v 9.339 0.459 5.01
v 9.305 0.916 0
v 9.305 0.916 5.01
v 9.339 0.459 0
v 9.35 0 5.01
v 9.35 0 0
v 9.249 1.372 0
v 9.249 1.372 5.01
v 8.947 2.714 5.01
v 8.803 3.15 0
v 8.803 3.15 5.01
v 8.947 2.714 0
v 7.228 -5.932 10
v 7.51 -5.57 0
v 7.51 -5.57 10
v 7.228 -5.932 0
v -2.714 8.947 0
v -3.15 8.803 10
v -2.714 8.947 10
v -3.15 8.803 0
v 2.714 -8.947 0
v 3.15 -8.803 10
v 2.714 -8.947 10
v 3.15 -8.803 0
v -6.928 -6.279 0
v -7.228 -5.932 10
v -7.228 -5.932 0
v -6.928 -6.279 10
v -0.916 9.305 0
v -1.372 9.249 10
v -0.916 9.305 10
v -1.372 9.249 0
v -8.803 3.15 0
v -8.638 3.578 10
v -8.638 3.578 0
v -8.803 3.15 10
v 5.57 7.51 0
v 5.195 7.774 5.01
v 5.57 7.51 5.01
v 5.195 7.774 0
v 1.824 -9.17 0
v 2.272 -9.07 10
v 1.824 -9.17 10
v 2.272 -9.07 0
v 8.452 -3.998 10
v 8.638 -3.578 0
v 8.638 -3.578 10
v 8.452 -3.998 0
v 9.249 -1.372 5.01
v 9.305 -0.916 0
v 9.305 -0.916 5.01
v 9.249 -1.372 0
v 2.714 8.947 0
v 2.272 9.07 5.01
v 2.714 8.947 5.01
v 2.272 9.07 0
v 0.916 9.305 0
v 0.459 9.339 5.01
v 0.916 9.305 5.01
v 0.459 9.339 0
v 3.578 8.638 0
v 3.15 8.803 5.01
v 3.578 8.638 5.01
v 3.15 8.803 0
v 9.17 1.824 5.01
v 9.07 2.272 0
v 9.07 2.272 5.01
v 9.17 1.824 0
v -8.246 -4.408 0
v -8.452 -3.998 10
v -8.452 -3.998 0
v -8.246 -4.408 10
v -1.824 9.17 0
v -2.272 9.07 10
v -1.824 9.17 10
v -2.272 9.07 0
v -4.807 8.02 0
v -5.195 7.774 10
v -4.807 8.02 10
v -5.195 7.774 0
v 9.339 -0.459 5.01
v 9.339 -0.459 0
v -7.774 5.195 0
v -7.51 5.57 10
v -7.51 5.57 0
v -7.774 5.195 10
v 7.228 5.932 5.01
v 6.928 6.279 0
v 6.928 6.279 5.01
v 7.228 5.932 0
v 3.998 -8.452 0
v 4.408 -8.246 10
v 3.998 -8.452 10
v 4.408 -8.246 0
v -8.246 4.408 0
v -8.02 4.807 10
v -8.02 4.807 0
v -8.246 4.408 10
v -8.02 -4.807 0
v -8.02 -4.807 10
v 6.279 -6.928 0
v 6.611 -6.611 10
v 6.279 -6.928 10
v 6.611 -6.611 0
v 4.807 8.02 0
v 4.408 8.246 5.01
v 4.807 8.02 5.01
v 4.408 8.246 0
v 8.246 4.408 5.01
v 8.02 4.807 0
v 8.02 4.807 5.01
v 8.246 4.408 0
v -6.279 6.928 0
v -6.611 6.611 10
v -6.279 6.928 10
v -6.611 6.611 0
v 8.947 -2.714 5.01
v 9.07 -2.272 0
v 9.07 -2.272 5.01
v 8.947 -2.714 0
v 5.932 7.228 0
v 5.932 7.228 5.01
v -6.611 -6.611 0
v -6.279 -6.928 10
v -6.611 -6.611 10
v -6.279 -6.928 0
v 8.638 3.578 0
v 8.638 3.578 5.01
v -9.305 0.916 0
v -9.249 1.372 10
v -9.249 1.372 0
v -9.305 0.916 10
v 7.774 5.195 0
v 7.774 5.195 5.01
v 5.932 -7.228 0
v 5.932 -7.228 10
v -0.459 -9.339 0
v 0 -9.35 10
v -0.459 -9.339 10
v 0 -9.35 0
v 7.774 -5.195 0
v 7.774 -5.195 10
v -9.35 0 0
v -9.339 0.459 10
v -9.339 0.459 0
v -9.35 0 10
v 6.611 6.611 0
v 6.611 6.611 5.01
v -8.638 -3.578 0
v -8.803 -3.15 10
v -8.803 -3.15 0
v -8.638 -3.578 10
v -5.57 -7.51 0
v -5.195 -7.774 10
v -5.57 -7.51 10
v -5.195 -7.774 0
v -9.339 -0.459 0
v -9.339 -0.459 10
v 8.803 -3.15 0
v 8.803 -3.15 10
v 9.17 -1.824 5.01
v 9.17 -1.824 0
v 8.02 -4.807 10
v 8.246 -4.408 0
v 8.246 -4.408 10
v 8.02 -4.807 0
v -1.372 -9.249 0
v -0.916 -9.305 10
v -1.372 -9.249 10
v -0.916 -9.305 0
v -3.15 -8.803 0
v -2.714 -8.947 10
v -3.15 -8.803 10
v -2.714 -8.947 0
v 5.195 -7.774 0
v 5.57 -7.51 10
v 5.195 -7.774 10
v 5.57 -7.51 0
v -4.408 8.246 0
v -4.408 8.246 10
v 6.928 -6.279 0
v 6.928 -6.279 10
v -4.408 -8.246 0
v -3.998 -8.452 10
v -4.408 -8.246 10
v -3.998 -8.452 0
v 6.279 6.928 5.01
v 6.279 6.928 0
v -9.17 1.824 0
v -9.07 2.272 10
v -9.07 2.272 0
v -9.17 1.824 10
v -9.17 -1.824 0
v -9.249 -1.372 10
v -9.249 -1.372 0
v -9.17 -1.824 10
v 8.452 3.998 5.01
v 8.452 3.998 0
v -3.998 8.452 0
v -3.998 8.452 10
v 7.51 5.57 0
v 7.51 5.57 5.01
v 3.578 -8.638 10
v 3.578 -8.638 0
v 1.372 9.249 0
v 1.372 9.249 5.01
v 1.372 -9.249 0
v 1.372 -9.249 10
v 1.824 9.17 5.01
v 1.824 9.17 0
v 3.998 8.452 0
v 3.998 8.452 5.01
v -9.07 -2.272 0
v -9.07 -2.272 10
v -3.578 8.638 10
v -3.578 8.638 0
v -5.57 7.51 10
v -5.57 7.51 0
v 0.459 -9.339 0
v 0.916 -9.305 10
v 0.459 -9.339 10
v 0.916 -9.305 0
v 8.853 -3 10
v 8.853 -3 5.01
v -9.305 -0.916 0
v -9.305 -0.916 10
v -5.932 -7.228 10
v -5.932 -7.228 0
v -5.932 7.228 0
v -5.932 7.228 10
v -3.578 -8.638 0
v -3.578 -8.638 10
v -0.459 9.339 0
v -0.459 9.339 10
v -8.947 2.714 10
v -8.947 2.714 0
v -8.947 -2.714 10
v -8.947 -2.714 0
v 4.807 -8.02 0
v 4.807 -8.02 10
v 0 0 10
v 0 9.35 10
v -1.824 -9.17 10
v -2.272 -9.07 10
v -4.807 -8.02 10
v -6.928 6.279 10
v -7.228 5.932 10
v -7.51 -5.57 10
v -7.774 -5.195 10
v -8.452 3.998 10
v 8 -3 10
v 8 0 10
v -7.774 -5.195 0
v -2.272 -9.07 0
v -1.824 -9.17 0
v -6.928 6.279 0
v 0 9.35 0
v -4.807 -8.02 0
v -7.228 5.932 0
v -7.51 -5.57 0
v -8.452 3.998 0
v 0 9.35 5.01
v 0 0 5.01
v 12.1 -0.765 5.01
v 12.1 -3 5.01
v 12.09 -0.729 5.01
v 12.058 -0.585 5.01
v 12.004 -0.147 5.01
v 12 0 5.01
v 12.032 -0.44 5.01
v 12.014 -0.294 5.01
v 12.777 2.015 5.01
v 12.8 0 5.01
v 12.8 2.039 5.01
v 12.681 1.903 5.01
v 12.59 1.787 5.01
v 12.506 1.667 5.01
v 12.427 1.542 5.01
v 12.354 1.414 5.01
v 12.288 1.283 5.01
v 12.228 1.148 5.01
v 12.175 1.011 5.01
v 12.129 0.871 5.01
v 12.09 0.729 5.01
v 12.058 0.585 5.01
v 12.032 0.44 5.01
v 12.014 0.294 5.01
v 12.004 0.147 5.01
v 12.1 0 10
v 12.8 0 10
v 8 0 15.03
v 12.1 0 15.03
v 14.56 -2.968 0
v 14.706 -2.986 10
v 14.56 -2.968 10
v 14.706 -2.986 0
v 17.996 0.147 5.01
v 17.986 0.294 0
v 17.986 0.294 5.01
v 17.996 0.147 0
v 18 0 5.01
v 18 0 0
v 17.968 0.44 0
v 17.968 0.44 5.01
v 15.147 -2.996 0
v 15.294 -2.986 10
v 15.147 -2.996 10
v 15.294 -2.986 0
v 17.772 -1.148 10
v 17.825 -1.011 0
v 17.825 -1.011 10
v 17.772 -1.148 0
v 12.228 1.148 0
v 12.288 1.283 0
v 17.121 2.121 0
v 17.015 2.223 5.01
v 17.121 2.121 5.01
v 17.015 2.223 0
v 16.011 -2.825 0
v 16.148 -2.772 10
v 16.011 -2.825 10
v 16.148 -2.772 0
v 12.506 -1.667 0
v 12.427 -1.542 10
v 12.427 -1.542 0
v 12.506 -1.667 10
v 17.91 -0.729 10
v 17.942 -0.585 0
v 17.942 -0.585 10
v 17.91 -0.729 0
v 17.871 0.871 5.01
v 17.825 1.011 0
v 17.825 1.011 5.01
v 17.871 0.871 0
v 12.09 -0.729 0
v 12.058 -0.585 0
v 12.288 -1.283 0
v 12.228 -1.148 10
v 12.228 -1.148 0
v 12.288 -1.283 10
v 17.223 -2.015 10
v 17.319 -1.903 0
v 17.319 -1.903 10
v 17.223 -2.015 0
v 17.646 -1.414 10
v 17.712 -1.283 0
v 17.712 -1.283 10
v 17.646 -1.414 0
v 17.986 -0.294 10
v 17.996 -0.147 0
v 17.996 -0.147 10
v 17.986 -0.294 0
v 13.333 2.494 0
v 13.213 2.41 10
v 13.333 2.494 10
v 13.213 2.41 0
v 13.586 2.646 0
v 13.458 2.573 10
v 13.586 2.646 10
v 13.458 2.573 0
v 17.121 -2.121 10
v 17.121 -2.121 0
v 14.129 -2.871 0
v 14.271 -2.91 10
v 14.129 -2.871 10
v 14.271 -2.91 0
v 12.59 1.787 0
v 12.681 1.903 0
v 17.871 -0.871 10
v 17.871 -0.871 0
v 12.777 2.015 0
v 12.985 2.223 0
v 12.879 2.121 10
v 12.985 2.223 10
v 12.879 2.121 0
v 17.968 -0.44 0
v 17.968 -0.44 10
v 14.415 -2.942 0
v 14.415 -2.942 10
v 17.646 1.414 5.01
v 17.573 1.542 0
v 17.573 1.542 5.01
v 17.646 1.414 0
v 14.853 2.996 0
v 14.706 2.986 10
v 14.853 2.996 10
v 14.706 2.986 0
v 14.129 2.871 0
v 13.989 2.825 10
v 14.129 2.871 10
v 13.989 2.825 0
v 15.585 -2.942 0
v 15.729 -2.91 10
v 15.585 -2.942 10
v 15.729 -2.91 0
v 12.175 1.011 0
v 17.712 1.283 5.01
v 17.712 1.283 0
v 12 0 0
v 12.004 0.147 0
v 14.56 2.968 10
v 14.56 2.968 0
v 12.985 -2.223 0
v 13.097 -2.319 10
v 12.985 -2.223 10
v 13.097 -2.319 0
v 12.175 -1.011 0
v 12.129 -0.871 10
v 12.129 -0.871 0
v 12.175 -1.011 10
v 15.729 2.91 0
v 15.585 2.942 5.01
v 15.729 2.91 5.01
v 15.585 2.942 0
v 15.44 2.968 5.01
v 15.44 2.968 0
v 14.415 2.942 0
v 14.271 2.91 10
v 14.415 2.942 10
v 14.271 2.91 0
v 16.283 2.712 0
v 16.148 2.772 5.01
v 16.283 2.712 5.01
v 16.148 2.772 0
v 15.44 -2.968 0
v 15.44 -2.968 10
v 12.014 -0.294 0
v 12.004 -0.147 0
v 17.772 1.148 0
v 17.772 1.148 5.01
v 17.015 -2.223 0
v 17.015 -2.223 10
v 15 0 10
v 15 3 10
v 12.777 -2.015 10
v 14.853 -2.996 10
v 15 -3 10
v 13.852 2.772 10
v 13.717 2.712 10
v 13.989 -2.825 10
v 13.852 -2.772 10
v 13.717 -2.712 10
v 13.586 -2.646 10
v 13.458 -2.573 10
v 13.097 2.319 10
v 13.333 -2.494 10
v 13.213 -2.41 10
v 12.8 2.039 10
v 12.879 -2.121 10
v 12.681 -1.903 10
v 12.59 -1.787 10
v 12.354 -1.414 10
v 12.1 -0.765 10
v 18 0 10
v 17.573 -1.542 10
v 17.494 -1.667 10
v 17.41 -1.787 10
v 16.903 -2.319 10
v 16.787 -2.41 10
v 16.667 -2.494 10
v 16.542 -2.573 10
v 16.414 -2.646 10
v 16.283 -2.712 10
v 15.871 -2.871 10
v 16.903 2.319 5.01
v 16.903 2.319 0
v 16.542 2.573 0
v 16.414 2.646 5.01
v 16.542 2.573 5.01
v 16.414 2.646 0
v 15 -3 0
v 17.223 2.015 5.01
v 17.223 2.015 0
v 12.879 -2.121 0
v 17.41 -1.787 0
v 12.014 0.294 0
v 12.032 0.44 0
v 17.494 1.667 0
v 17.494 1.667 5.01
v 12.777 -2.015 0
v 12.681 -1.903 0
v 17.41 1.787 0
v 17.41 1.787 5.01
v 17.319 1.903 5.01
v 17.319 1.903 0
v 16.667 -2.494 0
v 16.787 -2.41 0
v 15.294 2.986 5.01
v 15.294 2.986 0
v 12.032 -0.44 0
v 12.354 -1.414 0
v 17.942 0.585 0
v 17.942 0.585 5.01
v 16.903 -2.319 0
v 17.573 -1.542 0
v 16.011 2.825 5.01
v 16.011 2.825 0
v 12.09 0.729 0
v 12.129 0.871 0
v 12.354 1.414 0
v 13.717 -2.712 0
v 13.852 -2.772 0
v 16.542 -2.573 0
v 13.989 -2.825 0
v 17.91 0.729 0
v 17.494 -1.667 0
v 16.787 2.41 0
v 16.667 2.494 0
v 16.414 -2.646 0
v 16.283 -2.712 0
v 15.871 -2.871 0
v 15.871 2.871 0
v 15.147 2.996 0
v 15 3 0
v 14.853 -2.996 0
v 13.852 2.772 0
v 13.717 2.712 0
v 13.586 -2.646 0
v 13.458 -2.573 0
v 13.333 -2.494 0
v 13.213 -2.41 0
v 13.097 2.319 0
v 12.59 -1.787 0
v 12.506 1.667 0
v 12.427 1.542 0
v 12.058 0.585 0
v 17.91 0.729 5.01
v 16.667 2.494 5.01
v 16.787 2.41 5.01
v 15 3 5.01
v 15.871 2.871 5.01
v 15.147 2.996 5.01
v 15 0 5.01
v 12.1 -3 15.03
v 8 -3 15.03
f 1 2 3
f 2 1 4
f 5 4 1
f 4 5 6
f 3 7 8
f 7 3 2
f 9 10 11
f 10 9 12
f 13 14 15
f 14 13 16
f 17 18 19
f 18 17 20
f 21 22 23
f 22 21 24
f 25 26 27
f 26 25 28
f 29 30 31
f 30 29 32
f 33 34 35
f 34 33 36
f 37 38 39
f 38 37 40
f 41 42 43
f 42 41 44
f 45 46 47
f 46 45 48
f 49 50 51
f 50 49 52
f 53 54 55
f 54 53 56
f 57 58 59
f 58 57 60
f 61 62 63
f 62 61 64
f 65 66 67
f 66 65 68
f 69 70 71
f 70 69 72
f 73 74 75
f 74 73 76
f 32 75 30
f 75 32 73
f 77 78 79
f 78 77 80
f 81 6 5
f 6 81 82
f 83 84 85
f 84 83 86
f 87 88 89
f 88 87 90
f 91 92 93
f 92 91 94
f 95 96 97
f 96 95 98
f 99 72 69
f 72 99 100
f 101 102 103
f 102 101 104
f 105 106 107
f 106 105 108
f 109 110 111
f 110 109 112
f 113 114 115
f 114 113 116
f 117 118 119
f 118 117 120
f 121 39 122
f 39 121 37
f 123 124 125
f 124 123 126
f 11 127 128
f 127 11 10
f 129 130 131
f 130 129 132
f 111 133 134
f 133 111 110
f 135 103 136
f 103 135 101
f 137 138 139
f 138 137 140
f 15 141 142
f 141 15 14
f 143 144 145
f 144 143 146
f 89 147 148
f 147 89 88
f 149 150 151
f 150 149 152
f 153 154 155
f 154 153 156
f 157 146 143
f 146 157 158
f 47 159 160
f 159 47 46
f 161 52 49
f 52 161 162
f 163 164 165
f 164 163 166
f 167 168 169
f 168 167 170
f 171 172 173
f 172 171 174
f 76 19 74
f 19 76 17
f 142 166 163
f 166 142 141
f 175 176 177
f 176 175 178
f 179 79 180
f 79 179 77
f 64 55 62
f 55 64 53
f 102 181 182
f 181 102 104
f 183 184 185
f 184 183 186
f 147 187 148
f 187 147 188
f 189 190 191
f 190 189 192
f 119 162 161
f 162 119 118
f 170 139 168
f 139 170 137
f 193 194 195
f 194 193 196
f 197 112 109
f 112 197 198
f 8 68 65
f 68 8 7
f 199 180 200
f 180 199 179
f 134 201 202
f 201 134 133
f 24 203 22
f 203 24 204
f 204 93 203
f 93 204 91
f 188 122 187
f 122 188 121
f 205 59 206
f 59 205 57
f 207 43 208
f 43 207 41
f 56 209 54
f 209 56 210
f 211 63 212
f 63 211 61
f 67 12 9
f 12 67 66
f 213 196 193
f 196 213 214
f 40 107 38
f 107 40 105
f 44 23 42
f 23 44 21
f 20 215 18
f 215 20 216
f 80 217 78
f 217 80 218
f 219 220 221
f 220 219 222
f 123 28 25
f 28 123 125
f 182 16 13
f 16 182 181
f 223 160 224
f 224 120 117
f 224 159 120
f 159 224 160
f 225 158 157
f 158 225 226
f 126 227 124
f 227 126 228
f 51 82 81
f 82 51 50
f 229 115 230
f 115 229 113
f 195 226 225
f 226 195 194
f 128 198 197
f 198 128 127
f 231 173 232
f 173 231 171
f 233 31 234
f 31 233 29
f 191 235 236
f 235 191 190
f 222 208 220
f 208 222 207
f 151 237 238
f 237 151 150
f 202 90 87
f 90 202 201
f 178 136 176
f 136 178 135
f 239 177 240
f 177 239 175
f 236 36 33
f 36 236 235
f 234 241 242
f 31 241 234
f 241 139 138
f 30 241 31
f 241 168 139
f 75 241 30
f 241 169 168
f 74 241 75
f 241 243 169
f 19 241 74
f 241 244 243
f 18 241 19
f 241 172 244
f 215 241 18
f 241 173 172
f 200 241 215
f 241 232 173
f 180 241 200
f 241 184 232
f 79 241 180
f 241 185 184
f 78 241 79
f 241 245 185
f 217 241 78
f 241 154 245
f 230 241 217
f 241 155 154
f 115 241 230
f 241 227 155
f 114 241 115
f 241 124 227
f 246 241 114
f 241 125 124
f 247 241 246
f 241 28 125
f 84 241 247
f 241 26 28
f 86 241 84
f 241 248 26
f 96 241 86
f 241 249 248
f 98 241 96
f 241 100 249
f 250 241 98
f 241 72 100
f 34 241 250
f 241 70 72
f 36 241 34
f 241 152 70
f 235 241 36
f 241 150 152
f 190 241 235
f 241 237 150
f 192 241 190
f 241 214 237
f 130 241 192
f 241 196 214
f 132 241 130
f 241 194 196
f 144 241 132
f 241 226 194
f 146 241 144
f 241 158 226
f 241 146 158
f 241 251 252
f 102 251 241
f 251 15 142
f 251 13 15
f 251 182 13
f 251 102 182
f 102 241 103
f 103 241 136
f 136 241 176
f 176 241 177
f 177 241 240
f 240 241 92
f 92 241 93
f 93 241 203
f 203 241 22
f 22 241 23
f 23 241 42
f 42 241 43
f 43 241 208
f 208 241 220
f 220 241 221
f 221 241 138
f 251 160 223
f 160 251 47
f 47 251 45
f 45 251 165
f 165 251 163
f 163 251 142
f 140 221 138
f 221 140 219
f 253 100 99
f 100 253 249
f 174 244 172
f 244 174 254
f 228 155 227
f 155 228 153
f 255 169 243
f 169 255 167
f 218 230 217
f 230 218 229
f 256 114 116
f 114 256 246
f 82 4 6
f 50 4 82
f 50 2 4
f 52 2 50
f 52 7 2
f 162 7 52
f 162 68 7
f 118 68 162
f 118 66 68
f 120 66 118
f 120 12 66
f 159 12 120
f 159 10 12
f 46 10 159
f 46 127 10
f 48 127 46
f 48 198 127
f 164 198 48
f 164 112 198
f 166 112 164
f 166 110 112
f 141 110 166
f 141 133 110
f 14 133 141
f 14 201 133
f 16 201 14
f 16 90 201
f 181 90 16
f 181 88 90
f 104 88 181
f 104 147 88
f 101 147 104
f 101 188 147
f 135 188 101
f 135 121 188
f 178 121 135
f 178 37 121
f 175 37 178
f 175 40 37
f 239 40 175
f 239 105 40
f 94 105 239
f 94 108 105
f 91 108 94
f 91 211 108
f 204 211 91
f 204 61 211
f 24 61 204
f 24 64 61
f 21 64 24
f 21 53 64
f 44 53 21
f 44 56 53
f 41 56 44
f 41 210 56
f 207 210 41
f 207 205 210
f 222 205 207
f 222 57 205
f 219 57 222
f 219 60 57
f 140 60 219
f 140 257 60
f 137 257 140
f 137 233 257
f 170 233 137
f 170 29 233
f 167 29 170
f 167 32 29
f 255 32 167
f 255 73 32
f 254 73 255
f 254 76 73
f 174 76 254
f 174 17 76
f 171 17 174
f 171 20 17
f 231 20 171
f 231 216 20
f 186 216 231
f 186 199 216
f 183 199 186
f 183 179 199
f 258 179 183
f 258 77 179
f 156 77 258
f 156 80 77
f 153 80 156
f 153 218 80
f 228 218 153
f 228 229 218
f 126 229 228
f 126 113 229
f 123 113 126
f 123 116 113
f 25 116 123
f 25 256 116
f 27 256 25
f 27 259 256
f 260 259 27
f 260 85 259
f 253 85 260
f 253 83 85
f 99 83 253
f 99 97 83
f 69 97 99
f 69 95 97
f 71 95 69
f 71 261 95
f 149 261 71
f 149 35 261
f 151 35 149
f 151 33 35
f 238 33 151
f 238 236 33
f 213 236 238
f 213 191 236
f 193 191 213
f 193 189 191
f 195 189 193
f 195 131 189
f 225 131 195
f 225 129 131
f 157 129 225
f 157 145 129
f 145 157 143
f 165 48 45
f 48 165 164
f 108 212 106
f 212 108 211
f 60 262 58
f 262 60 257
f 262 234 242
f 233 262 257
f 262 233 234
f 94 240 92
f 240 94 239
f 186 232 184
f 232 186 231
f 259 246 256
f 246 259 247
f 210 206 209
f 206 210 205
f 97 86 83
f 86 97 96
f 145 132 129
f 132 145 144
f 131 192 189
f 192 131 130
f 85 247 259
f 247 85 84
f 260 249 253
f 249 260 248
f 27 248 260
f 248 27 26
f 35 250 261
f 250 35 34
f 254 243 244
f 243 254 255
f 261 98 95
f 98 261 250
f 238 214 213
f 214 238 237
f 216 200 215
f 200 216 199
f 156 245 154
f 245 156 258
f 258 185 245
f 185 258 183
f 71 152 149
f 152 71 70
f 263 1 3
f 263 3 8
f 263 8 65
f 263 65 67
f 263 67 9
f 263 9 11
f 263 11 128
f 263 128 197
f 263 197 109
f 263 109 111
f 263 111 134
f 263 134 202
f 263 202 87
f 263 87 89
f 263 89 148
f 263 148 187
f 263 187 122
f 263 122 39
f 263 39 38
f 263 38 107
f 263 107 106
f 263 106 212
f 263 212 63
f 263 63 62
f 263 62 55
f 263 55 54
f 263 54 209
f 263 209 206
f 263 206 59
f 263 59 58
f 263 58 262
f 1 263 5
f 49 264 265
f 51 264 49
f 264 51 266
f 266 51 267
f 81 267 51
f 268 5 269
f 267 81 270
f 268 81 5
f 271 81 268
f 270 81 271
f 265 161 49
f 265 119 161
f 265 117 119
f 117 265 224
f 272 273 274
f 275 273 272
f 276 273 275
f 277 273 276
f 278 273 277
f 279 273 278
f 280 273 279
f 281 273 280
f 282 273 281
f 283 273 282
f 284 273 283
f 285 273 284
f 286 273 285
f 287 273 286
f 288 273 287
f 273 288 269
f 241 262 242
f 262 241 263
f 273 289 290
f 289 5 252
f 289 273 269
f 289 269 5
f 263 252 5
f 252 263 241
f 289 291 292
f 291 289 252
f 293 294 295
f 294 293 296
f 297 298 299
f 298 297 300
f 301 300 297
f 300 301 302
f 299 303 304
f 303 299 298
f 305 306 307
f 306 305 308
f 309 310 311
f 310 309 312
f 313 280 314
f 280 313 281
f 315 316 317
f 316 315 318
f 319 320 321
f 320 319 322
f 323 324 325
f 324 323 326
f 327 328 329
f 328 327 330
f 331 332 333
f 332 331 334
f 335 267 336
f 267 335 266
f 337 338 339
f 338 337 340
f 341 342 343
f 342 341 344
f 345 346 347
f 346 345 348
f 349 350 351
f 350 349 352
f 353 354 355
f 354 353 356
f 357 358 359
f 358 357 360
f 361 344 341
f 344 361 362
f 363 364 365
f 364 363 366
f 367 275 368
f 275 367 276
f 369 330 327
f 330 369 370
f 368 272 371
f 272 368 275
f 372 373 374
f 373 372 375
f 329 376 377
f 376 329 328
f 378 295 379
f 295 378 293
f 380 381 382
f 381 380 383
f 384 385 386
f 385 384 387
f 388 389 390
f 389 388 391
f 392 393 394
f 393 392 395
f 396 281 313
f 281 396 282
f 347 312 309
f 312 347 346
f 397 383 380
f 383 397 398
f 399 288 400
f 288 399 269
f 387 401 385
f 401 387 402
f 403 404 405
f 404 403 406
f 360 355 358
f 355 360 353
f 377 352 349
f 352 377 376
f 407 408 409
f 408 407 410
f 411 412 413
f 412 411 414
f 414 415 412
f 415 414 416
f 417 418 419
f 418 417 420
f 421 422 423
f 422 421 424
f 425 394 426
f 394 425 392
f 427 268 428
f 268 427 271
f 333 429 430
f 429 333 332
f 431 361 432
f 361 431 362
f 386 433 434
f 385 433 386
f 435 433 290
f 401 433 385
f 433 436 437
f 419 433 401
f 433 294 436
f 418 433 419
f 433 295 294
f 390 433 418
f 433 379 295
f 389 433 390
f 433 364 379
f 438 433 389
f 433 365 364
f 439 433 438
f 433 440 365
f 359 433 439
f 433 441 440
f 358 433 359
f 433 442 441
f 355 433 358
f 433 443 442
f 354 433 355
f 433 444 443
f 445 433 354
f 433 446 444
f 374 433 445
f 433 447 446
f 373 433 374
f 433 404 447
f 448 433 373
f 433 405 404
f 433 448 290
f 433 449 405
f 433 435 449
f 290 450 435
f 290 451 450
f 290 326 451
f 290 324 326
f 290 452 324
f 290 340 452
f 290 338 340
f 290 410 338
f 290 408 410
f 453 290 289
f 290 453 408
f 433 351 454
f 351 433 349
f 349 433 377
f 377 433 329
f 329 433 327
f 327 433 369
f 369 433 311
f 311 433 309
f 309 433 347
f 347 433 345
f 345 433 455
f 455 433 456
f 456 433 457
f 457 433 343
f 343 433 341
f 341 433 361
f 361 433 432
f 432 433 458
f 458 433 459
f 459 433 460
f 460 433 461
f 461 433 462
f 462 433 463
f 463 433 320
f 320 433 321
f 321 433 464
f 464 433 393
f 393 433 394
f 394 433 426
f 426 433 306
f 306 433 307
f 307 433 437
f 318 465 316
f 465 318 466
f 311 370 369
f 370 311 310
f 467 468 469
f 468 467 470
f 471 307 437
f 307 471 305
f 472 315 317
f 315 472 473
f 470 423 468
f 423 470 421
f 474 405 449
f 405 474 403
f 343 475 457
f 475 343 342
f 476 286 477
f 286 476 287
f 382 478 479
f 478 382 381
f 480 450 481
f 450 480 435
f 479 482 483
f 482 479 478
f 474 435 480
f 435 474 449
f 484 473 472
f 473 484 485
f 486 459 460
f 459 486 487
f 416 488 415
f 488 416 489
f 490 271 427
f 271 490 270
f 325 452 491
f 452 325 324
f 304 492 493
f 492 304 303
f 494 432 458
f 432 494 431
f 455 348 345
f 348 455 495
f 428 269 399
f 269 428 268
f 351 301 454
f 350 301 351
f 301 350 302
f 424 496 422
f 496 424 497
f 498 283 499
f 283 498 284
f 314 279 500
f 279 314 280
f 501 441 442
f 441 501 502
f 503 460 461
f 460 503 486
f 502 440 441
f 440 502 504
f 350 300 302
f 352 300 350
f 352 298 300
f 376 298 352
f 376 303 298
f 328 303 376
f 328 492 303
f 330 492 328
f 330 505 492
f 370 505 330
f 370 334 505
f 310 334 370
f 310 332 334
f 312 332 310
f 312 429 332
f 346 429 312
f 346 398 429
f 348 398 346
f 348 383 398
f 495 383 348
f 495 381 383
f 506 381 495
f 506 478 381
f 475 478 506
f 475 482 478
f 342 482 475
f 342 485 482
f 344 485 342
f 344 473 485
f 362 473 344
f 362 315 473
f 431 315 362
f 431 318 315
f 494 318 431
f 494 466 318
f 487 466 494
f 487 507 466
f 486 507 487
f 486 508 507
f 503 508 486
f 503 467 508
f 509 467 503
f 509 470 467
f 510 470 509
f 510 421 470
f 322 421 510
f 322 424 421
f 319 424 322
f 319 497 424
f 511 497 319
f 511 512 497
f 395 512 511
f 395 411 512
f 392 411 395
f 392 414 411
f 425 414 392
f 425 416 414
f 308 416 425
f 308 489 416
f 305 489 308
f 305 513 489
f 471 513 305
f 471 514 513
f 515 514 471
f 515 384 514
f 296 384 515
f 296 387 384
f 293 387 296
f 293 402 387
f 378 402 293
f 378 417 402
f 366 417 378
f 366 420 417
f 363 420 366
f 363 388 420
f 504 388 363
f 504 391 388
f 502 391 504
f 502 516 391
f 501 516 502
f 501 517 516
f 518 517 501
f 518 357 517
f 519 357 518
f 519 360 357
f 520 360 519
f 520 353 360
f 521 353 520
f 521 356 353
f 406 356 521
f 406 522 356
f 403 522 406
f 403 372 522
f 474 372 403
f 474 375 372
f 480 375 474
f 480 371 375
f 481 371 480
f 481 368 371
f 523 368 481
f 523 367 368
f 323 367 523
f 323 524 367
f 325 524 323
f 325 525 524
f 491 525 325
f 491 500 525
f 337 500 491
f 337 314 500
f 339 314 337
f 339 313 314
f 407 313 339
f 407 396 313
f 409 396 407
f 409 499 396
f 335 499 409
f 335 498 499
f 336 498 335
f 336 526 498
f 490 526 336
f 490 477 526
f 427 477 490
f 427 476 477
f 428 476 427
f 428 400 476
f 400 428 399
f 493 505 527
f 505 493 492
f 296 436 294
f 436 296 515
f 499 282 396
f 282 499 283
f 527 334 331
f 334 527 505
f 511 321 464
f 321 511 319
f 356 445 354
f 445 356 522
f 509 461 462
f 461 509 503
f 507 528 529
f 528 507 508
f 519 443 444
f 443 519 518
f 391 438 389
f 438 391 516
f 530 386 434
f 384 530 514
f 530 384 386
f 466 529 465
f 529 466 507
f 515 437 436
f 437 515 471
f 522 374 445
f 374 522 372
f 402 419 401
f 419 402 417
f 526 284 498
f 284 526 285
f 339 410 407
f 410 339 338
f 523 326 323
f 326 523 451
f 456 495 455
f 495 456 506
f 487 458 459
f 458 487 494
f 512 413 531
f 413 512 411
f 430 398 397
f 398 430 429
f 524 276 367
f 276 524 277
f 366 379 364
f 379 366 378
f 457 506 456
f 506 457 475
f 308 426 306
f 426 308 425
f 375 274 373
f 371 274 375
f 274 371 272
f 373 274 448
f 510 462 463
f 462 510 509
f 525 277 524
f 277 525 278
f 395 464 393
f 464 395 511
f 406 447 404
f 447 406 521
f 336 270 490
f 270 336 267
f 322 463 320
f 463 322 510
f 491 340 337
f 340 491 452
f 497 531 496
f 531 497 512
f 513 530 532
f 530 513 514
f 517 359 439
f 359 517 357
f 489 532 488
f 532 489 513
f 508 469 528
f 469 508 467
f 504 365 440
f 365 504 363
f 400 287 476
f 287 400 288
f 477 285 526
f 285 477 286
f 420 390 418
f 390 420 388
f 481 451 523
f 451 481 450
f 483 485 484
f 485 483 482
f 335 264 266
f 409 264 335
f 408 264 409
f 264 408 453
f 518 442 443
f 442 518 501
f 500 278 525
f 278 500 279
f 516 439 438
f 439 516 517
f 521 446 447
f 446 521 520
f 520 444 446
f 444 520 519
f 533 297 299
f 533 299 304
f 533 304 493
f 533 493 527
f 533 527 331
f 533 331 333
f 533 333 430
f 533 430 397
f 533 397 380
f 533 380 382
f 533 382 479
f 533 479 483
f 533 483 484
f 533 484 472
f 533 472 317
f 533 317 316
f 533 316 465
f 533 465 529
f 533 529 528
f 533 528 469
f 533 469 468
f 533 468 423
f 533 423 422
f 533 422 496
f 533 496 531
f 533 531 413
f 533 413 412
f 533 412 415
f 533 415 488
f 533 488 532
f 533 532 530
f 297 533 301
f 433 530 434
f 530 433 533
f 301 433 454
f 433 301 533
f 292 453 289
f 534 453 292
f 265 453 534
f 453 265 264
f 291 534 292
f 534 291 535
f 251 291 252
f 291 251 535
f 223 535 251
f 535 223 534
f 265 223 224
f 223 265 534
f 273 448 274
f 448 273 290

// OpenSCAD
$fn = 128; // High resolution for smooth curves and accurate hole sizes

// --- Dimensions ---
// Rod Stand Dimensions
$rod_diameter = 12.7;
$rod_wall_thickness = 3;
$rod_outer_diameter = $rod_diameter + (2 * $rod_wall_thickness); // 18.7 mm
$rod_inner_radius = $rod_diameter / 2;

// Tubing Dimensions
$tubing_outer_diameter = 6;
$tubing_wall_thickness = 2;
$tubing_inner_diameter = $tubing_outer_diameter - (2 * $tubing_wall_thickness); // 4 mm
$tubing_inner_radius = $tubing_inner_diameter / 2;

// Positioning
$rod_center = [0, 0];
$tubing_center = [15, 0];

// Bridge Dimensions
$bridge_width_x = 4; // From x=8 to x=12
$bridge_width_y = 6;
$bridge_start_x = 8;
$bridge_end_x = 12;

// Cutout Dimensions
// Rod Cutout: 10mm wide (-5 to +5), centered at y=0
$rod_cutout_width = 10;
$rod_cutout_half_y = $rod_cutout_width / 2;

// Tubing Cutout: 4.5mm wide (-2.25 to +2.25), centered at y=0
$tubing_cutout_width = 4.5;
$tubing_cutout_half_y = $tubing_cutout_width / 2;

// Extrusion Height
$height = 10;

// --- Main Module ---
module lab_clip() {
    difference() {
        // 1. Create the solid base profile (Union of all parts)
        union() {
            // Rod Ring
            difference() {
                cylinder(
                    h = $height,
                    r = $rod_outer_diameter / 2,
                    center = $rod_center
                );
                
                // Cutout for Rod Ring
                // Extends slightly past the face to ensure clean cut
                translate([0, 0, $height/2 + 0.01]) 
                    cube([
                        $rod_cutout_width + 0.1, 
                        $rod_cutout_half_y * 2 + 0.1, 
                        $height + 0.02
                    ]);
            }
            
            // Tubing Ring
            translate($tubing_center)
            difference() {
                cylinder(
                    h = $height,
                    r = $tubing_outer_diameter / 2,
                    center = [0, 0]
                );
                
                // Cutout for Tubing Ring
                // Extends slightly past the face to ensure clean cut
                translate([0, 0, $height/2 + 0.01]) 
                    cube([
                        $tubing_cutout_width + 0.1, 
                        $tubing_cutout_half_y * 2 + 0.1, 
                        $height + 0.02
                    ]);
            }
            
            // Solid Bridge
            // Extends slightly past the face to ensure clean cut
            translate([$bridge_start_x, -($bridge_width_y/2), $height/2 + 0.01])
                cube([
                    $bridge_width_x + 0.1, 
                    $bridge_width_y + 0.1, 
                    $height + 0.02
                ]);
        }
        
        // 2. Cut out the internal voids (Difference)
        // We use a slightly larger extrusion for the voids to ensure no coplanar faces
        
        // Void inside Rod Ring
        translate($rod_center)
        translate([0, 0, $height/2 + 0.01])
            cube([
                $rod_diameter + 0.1, 
                $rod_diameter + 0.1, 
                $height + 0.02
            ]);
            
        // Void inside Tubing Ring
        translate($tubing_center)
        translate([0, 0, $height/2 + 0.01])
            cube([
                $tubing_inner_diameter + 0.1, 
                $tubing_inner_diameter + 0.1, 
                $height + 0.02
            ]);
    }
}

// Render the part
lab_clip();
